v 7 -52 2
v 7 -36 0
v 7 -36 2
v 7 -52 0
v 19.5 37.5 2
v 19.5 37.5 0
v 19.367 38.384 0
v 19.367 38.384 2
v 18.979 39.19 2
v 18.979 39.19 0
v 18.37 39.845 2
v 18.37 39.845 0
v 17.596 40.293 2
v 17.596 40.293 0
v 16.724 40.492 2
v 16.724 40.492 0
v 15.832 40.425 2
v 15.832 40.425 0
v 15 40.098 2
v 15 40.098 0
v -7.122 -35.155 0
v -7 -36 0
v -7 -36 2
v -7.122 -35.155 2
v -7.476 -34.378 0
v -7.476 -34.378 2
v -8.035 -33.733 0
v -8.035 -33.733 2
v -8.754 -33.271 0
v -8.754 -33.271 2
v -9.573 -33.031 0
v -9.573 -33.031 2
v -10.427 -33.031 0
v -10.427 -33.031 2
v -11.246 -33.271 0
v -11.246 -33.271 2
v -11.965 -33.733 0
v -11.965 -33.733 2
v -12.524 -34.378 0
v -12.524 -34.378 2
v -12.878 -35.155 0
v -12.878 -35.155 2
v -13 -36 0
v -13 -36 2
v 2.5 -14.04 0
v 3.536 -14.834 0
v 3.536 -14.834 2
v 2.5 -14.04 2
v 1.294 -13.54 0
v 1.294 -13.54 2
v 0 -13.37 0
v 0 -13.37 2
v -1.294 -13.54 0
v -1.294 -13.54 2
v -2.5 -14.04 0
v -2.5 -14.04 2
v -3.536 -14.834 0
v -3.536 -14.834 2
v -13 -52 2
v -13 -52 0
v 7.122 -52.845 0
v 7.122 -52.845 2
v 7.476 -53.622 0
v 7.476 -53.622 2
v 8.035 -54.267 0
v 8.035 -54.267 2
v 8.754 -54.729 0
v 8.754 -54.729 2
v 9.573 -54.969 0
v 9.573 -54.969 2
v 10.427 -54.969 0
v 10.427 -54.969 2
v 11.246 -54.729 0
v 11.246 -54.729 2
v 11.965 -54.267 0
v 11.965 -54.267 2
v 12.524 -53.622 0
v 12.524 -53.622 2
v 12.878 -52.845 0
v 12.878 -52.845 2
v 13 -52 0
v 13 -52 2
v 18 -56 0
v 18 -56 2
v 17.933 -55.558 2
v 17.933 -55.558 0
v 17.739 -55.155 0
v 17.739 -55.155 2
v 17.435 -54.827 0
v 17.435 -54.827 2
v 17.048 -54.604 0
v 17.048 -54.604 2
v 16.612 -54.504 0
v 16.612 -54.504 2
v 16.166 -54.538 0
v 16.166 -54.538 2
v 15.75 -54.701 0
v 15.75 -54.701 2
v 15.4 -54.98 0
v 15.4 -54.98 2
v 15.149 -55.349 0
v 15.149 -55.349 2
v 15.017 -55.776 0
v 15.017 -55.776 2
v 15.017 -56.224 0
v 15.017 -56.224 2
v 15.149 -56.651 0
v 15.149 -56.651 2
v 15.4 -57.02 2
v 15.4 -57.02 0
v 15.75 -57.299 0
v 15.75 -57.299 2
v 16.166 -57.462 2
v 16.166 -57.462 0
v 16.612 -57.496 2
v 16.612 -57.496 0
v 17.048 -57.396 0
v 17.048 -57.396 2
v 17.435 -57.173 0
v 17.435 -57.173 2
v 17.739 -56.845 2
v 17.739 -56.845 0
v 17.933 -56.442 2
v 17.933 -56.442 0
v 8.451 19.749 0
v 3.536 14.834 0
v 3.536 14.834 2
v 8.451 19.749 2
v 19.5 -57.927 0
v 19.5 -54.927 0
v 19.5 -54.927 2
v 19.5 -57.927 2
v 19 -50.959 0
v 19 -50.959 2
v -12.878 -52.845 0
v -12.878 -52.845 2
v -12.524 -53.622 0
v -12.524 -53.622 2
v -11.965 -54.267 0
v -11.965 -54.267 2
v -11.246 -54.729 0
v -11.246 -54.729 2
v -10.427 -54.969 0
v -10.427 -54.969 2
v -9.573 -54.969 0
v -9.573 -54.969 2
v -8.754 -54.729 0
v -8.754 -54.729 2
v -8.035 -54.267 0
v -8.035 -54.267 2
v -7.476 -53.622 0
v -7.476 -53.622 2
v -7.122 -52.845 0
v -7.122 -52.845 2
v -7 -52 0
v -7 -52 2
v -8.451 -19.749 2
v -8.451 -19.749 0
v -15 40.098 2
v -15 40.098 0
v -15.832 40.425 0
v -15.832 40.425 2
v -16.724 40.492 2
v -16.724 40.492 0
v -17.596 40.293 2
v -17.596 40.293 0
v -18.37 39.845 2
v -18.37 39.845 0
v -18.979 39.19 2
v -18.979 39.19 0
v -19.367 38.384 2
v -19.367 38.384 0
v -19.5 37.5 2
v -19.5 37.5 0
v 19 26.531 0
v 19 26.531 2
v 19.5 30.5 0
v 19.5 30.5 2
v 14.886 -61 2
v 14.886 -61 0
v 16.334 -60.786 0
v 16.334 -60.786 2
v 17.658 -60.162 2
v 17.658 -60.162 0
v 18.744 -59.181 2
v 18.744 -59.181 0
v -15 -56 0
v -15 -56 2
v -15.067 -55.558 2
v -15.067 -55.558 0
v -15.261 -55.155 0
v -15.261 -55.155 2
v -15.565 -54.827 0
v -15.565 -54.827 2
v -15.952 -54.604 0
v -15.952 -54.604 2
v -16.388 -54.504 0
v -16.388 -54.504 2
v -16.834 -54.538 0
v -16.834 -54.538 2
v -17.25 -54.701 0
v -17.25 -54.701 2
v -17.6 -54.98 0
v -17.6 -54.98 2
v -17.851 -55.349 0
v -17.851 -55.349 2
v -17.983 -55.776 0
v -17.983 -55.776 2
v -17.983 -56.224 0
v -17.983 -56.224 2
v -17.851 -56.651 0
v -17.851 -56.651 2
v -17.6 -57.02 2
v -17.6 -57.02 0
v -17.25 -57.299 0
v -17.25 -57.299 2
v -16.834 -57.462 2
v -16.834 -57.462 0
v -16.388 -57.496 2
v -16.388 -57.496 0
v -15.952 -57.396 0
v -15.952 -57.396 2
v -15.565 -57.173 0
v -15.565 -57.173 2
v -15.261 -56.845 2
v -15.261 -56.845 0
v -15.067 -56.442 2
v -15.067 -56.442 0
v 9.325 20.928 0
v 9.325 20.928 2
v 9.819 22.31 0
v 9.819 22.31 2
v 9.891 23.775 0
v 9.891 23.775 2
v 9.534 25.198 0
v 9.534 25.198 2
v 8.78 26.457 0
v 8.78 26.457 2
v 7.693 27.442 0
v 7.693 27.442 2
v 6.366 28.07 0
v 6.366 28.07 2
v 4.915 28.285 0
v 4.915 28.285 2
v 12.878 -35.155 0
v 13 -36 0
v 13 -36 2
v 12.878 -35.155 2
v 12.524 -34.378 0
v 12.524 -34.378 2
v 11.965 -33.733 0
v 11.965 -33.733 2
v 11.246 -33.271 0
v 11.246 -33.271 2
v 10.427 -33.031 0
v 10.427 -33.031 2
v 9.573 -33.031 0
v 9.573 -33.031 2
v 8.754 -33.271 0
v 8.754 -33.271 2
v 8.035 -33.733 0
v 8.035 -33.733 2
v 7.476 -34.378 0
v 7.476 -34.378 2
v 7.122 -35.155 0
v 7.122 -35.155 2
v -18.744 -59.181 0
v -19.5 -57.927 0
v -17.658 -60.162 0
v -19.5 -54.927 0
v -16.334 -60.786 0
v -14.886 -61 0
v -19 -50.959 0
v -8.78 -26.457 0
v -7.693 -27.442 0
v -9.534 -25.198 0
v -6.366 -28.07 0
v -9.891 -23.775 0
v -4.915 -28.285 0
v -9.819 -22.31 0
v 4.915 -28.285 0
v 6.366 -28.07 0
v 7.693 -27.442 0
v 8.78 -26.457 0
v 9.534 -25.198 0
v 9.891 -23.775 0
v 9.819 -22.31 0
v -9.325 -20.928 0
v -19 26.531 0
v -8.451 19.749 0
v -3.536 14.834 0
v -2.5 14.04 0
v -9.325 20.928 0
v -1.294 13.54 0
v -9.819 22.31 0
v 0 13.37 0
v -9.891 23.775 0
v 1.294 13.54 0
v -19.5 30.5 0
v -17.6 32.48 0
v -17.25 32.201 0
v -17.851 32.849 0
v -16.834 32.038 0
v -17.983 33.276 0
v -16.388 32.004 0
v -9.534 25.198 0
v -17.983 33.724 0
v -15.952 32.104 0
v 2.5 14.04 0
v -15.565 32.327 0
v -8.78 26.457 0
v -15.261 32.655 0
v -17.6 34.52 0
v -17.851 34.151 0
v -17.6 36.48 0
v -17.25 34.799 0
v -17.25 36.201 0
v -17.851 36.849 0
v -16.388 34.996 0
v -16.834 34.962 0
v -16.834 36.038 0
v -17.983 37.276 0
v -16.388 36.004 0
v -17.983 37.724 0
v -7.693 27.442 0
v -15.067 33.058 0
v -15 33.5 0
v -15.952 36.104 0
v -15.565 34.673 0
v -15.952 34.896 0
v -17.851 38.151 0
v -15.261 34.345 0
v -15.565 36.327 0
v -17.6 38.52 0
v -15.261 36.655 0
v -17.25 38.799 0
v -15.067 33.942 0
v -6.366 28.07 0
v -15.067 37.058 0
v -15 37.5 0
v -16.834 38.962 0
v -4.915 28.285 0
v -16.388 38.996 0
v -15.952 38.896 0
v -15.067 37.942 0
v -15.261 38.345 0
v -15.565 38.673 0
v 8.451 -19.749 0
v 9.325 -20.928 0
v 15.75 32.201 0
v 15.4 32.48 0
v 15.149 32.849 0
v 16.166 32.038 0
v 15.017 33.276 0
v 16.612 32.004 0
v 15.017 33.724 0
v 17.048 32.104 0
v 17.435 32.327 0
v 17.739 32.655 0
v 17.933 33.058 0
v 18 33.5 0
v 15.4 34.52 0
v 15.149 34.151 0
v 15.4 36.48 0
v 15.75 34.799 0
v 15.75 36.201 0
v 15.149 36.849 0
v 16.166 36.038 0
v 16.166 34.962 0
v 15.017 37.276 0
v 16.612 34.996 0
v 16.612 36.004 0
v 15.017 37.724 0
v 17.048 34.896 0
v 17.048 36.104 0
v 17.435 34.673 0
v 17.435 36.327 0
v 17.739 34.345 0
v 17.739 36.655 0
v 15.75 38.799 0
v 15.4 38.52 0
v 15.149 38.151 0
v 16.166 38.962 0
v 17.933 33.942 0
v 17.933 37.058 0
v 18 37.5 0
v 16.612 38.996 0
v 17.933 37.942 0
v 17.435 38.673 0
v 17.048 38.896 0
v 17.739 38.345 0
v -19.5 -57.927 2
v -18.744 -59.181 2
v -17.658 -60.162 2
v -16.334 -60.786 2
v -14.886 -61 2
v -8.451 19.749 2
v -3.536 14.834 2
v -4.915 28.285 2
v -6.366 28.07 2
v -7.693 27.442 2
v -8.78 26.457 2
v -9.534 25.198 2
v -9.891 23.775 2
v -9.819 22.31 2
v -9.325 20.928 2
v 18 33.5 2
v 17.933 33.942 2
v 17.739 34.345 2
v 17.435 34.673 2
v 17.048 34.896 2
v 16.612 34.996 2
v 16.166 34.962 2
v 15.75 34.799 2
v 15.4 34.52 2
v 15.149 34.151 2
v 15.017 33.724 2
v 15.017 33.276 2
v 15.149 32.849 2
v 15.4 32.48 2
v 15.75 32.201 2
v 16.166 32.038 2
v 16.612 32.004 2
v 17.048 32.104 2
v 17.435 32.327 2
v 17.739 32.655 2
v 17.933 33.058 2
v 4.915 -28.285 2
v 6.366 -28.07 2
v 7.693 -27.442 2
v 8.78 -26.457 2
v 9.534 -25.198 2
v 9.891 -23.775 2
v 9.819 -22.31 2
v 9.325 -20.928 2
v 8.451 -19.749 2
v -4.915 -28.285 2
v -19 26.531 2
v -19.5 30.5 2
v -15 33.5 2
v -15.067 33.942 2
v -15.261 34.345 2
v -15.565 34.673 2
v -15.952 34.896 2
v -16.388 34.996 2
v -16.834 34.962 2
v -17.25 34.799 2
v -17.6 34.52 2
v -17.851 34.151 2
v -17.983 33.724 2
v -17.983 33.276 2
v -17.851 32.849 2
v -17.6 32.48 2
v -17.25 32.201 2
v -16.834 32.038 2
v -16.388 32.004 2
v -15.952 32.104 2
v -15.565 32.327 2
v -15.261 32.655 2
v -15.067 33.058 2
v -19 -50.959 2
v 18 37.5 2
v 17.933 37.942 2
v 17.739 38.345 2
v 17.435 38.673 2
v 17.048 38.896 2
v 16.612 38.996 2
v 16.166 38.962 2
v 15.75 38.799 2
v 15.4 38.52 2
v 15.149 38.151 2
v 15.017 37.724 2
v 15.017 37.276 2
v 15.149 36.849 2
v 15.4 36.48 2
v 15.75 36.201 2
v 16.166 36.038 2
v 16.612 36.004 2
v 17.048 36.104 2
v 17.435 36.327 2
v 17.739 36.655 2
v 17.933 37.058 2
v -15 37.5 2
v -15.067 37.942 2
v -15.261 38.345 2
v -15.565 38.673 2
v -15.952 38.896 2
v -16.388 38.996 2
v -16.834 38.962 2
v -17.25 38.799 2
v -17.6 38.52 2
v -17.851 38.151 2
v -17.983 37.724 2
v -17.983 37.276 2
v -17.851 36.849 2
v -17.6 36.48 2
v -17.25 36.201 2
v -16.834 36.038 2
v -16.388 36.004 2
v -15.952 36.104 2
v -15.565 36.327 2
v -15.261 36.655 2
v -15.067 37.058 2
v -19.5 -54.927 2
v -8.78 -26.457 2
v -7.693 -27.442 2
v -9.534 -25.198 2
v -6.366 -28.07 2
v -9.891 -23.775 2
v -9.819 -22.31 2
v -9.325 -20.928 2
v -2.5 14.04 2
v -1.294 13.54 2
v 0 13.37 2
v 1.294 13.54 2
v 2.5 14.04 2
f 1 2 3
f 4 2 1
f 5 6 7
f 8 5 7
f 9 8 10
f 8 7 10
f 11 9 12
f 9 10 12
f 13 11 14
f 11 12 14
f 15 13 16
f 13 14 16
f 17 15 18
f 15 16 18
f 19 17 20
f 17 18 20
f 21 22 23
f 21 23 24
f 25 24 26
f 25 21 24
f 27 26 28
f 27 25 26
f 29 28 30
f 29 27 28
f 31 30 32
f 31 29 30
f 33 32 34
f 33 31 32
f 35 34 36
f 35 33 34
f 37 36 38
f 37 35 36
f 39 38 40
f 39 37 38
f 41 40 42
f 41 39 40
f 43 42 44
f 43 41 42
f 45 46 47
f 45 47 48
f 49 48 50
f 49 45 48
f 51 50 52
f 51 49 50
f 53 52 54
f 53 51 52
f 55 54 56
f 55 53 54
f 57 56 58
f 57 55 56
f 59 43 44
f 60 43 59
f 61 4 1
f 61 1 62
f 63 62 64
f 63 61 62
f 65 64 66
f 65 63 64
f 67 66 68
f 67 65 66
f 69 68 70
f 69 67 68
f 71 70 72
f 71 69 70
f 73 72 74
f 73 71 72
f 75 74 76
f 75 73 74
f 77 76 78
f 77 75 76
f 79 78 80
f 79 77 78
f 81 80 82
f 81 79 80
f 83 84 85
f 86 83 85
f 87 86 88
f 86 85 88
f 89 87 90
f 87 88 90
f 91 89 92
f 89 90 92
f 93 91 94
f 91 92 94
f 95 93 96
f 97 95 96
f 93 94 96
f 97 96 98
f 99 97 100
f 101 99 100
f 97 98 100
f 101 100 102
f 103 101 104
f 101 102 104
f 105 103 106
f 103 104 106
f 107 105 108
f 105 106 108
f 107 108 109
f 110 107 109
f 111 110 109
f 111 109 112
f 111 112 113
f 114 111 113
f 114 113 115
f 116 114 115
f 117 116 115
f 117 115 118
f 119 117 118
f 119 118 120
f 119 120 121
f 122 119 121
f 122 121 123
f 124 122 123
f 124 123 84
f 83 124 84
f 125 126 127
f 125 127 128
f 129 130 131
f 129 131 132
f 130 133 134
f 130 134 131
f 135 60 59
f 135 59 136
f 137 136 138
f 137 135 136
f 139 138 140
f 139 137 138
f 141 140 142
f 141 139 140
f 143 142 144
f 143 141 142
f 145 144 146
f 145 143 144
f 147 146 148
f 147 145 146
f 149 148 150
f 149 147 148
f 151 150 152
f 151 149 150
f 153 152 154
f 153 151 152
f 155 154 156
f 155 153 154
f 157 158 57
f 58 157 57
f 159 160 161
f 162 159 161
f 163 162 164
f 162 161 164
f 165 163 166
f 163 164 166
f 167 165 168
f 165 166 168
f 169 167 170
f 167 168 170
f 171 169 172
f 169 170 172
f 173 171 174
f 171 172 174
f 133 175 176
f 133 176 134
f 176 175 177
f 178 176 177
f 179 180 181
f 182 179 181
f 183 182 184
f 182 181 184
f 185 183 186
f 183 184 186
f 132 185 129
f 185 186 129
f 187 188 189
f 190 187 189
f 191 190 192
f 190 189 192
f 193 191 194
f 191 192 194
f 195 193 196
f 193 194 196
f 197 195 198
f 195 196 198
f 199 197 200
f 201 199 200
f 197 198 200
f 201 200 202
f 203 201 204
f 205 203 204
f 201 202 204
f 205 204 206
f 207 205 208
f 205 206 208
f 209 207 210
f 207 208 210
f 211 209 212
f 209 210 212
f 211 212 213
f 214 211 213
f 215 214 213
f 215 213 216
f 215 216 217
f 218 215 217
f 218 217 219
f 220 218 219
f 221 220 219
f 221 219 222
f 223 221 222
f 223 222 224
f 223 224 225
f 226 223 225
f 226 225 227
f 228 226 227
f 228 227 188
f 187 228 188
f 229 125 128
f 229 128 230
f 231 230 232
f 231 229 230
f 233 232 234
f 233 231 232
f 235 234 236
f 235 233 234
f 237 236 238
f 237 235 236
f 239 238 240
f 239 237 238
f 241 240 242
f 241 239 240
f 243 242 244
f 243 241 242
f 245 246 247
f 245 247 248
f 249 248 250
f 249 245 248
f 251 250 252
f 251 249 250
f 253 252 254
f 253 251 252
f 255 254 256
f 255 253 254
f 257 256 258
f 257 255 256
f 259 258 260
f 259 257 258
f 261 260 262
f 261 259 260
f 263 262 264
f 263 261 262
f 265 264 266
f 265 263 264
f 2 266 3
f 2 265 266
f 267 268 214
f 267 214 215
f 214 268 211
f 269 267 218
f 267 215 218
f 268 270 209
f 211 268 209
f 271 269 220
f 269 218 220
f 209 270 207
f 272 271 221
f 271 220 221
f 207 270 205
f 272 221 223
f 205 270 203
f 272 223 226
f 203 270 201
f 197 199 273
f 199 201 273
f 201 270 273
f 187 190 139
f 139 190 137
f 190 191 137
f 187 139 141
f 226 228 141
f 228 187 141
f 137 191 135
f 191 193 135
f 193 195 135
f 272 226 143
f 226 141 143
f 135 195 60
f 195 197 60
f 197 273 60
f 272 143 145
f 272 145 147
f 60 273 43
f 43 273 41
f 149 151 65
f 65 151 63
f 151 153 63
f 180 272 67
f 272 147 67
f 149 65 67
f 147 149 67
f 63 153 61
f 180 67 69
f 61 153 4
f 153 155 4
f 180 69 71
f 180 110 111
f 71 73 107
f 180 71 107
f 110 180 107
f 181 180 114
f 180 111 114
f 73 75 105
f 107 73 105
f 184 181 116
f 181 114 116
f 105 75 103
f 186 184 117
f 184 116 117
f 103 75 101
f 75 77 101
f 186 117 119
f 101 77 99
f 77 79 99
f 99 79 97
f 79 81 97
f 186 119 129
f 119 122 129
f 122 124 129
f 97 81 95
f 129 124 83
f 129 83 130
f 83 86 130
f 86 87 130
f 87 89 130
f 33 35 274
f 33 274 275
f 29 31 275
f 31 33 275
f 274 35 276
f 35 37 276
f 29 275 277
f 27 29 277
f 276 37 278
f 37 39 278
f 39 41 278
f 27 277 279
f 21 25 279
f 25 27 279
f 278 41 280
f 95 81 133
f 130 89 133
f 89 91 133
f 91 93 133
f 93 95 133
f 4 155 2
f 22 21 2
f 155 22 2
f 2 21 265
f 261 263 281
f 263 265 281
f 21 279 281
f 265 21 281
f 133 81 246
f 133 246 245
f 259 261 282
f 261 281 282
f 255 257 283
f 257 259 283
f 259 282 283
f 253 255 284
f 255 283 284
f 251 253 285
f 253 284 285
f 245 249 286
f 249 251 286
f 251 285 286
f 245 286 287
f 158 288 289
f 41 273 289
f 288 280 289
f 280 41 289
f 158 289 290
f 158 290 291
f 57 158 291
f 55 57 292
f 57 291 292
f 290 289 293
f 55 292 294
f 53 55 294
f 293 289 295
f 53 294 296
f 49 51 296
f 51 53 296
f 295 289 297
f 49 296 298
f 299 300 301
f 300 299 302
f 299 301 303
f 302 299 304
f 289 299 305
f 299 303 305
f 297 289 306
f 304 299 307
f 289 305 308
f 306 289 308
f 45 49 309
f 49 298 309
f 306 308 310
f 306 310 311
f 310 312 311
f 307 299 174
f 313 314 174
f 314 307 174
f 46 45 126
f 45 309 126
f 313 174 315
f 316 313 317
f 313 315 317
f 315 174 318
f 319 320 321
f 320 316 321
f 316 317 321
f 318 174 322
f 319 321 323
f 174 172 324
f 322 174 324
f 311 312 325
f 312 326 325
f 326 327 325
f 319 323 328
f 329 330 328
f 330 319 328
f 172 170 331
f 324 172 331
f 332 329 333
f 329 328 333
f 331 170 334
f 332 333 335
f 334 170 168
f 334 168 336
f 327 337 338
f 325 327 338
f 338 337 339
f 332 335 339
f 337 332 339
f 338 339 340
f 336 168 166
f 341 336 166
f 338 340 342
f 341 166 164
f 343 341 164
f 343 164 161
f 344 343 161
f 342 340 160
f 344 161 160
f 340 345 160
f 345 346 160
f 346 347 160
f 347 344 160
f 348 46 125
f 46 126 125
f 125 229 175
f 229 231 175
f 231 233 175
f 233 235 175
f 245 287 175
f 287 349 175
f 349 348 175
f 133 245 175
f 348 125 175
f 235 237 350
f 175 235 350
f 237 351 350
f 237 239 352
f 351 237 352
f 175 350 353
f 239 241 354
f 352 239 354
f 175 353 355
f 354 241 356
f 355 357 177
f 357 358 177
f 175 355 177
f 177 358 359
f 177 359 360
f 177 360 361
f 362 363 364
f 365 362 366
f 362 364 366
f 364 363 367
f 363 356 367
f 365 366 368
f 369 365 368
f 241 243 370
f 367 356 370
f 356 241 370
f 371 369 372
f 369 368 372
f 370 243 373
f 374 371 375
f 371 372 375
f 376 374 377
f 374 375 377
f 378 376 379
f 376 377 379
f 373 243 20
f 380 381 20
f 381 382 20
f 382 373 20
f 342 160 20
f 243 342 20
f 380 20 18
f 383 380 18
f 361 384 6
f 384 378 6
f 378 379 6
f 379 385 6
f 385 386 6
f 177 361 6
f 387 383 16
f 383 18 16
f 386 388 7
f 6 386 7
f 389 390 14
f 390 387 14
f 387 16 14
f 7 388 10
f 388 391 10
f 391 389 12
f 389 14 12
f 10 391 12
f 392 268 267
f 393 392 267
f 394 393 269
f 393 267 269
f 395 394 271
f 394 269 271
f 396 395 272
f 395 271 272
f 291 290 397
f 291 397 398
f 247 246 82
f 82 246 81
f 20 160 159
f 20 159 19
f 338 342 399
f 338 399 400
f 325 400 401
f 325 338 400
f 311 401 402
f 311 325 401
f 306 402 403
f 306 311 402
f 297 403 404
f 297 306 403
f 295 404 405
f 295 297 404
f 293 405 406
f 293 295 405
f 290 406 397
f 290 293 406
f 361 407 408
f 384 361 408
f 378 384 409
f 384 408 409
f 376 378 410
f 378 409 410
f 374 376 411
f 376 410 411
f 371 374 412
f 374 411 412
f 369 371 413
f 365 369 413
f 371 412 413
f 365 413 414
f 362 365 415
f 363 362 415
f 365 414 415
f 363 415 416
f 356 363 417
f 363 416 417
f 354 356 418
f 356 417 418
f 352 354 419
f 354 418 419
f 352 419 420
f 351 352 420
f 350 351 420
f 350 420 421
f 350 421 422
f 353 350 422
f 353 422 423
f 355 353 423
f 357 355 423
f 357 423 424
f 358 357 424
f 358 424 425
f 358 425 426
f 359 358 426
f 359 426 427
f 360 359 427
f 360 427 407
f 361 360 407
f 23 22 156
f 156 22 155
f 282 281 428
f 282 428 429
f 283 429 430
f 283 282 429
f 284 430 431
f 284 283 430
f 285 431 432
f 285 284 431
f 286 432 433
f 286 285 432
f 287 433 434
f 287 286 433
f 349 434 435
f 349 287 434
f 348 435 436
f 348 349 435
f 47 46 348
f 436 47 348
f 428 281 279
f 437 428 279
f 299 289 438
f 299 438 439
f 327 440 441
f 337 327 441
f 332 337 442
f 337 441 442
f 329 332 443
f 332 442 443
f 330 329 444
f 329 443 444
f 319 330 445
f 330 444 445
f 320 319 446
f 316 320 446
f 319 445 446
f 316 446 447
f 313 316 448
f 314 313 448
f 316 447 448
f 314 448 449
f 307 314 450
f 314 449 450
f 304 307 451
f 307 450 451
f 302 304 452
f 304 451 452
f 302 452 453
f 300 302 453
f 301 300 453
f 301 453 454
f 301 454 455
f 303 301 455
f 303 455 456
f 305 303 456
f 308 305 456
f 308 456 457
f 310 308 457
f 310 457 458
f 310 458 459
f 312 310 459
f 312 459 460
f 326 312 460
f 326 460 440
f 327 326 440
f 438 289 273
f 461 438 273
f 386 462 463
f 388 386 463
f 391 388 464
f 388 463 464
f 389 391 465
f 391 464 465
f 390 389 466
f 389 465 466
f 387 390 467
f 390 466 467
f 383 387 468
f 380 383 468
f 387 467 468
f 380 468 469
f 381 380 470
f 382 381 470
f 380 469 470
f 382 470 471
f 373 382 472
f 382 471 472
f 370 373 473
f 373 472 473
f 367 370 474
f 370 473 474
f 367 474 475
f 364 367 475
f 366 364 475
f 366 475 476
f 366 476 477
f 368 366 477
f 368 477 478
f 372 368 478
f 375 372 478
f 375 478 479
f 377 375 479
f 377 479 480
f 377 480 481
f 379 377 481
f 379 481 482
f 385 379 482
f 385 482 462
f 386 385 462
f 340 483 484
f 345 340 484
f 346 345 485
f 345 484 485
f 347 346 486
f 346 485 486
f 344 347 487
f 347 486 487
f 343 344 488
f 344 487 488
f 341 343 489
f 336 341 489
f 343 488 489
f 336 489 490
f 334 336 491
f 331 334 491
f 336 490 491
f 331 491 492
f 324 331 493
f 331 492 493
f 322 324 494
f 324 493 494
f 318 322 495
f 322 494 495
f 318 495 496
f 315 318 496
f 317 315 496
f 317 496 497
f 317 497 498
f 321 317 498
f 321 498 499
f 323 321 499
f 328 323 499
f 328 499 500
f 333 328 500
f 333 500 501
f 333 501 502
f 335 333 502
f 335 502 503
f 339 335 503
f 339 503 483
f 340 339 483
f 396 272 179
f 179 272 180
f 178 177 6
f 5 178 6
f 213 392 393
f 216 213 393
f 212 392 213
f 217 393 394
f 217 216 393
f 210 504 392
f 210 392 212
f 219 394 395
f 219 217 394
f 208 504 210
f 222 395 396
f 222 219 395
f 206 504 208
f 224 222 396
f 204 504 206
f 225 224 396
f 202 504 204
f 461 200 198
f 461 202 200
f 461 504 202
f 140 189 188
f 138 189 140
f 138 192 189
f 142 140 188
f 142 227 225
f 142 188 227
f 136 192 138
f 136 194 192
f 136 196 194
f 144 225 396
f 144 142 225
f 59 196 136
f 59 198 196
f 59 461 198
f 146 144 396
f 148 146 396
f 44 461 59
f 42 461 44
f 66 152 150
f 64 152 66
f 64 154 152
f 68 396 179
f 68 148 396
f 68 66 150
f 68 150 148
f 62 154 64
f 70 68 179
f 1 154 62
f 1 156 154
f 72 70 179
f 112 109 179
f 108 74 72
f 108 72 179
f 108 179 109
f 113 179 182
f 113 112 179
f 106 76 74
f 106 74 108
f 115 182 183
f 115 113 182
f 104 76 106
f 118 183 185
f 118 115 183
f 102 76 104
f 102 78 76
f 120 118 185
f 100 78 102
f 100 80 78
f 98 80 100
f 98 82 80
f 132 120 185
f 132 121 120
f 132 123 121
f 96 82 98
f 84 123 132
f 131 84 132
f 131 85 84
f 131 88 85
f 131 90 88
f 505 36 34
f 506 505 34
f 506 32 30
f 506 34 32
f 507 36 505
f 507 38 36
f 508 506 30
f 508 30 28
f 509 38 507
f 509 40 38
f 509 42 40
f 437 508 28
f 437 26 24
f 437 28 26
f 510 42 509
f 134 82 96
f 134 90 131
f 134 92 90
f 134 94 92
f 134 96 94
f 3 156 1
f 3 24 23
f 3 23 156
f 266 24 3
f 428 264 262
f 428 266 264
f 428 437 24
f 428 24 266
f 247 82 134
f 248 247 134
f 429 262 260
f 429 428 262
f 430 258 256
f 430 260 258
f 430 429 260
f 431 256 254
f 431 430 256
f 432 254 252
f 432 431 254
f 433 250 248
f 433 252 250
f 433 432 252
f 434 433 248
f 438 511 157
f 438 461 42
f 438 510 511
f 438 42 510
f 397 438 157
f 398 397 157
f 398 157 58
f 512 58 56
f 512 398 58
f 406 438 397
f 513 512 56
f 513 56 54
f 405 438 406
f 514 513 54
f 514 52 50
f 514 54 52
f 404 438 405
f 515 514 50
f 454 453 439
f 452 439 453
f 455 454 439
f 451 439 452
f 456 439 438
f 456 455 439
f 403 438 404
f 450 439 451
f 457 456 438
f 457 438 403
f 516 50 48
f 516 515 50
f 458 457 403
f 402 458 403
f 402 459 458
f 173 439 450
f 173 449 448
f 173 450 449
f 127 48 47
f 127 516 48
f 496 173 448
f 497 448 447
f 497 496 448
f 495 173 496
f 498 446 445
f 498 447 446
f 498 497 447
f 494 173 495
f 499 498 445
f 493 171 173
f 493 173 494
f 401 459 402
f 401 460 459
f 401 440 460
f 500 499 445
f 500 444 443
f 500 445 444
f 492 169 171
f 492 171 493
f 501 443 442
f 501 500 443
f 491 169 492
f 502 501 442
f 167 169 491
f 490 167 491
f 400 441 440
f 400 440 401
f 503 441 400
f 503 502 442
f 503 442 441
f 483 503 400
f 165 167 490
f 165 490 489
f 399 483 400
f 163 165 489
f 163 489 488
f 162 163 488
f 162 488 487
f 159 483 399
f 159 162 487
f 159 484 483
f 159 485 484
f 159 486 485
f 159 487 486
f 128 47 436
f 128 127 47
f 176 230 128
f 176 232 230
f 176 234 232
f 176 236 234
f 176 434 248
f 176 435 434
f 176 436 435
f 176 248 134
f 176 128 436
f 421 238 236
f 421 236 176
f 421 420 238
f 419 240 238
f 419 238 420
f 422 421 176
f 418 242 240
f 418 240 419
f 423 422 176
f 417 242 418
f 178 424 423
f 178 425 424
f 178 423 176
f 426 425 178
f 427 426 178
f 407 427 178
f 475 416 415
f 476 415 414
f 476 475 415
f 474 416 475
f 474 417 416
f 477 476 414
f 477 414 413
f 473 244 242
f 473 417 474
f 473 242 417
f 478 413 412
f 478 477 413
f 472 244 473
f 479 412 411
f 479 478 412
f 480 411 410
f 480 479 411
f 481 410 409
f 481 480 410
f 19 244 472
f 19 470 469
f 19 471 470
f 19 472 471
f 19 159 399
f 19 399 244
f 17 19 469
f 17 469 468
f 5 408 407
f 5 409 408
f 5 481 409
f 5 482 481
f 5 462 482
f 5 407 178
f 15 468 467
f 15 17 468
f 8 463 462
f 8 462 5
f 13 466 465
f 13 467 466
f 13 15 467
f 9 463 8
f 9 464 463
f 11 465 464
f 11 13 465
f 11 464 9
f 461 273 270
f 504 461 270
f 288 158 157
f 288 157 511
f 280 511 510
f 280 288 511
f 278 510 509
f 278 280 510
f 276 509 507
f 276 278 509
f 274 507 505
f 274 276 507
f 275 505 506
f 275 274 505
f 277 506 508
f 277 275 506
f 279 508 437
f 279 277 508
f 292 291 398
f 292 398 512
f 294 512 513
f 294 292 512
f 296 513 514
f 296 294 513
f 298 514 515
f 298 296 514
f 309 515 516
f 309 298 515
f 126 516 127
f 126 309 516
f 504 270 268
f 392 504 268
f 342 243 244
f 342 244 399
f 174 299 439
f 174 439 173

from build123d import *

# Parameters (mm, degrees)
PAD_DEPTH    = 2
SKETCH001_R  = 1.5
POCKET_DEPTH = 2.001


with BuildPart() as part:
    # Sketch → Pad (new body)
    with BuildSketch(Plane.XY):
        with BuildLine():
            Line((-14.886358, -61), (14.886358, -61))
            ThreePointArc((14.886358, -61), (17.657976, -60.161506), (19.5, -57.927254))
            Line((19.5, -54.927254), (19.5, -57.927254))
            Line((19, -50.958627), (19.5, -54.927254))
            Line((19, 26.531373), (19, -50.958627))
            Line((19, 26.531373), (19.5, 30.5))
            Line((19.5, 30.5), (19.5, 37.5))
            ThreePointArc((19.5, 37.5), (18, 40.098076), (15, 40.098076))
            Line((-15, 40.098076), (15, 40.098076))
            ThreePointArc((-15, 40.098076), (-18, 40.098076), (-19.5, 37.5))
            Line((-19.5, 30.5), (-19.5, 37.5))
            Line((-19, 26.531373), (-19.5, 30.5))
            Line((-19, 26.531373), (-19, -50.958627))
            Line((-19, -50.958627), (-19.5, -54.927254))
            Line((-19.5, -54.927254), (-19.5, -57.927254))
            ThreePointArc((-19.5, -57.927254), (-17.657976, -60.161506), (-14.886358, -61))
        make_face()
        with BuildLine():
            ThreePointArc((-7, -36), (-10, -33), (-13, -36))
            Line((-13, -36), (-13, -52))
            ThreePointArc((-13, -52), (-10, -55), (-7, -52))
            Line((-7, -36), (-7, -52))
        make_face(mode=Mode.SUBTRACT)
        with BuildLine():
            ThreePointArc((13, -36), (10, -33), (7, -36))
            Line((7, -36), (7, -52))
            ThreePointArc((7, -52), (10, -55), (13, -52))
            Line((13, -36), (13, -52))
        make_face(mode=Mode.SUBTRACT)
        with BuildLine():
            Line((-8.450534, 19.749437), (-3.535534, 14.834437))
            ThreePointArc((-3.535534, 14.834437), (0, 13.369971), (3.535534, 14.834437))
            Line((3.535534, 14.834437), (8.450534, 19.749437))
            ThreePointArc((8.450534, 19.749437), (9.534398, 25.198388), (4.915, 28.284971))
            Line((4.915, 28.284971), (-4.915, 28.284971))
            ThreePointArc((-4.915, 28.284971), (-9.534398, 25.198388), (-8.450534, 19.749437))
        make_face(mode=Mode.SUBTRACT)
        with BuildLine():
            Line((3.535534, -14.834437), (8.450534, -19.749437))
            ThreePointArc((4.915, -28.284971), (9.534398, -25.198388), (8.450534, -19.749437))
            Line((4.915, -28.284971), (-4.915, -28.284971))
            ThreePointArc((-8.450534, -19.749437), (-9.534398, -25.198388), (-4.915, -28.284971))
            Line((-8.450534, -19.749437), (-3.535534, -14.834437))
            ThreePointArc((3.535534, -14.834437), (0, -13.369971), (-3.535534, -14.834437))
        make_face(mode=Mode.SUBTRACT)
    extrude(amount=PAD_DEPTH)

    # Sketch001 → Pocket (cut, through all)
    with BuildSketch(Plane.XY.offset(2)):
        with Locations((-16.5, 33.5)):
            Circle(SKETCH001_R)
        with Locations((16.5, 33.5)):
            Circle(SKETCH001_R)
        with Locations((16.5, -56)):
            Circle(SKETCH001_R)
        with Locations((-16.5, -56)):
            Circle(SKETCH001_R)
        with Locations((16.5, 37.5)):
            Circle(SKETCH001_R)
        with Locations((-16.5, 37.5)):
            Circle(SKETCH001_R)
    extrude(amount=-POCKET_DEPTH, mode=Mode.SUBTRACT)


solid = part.part
